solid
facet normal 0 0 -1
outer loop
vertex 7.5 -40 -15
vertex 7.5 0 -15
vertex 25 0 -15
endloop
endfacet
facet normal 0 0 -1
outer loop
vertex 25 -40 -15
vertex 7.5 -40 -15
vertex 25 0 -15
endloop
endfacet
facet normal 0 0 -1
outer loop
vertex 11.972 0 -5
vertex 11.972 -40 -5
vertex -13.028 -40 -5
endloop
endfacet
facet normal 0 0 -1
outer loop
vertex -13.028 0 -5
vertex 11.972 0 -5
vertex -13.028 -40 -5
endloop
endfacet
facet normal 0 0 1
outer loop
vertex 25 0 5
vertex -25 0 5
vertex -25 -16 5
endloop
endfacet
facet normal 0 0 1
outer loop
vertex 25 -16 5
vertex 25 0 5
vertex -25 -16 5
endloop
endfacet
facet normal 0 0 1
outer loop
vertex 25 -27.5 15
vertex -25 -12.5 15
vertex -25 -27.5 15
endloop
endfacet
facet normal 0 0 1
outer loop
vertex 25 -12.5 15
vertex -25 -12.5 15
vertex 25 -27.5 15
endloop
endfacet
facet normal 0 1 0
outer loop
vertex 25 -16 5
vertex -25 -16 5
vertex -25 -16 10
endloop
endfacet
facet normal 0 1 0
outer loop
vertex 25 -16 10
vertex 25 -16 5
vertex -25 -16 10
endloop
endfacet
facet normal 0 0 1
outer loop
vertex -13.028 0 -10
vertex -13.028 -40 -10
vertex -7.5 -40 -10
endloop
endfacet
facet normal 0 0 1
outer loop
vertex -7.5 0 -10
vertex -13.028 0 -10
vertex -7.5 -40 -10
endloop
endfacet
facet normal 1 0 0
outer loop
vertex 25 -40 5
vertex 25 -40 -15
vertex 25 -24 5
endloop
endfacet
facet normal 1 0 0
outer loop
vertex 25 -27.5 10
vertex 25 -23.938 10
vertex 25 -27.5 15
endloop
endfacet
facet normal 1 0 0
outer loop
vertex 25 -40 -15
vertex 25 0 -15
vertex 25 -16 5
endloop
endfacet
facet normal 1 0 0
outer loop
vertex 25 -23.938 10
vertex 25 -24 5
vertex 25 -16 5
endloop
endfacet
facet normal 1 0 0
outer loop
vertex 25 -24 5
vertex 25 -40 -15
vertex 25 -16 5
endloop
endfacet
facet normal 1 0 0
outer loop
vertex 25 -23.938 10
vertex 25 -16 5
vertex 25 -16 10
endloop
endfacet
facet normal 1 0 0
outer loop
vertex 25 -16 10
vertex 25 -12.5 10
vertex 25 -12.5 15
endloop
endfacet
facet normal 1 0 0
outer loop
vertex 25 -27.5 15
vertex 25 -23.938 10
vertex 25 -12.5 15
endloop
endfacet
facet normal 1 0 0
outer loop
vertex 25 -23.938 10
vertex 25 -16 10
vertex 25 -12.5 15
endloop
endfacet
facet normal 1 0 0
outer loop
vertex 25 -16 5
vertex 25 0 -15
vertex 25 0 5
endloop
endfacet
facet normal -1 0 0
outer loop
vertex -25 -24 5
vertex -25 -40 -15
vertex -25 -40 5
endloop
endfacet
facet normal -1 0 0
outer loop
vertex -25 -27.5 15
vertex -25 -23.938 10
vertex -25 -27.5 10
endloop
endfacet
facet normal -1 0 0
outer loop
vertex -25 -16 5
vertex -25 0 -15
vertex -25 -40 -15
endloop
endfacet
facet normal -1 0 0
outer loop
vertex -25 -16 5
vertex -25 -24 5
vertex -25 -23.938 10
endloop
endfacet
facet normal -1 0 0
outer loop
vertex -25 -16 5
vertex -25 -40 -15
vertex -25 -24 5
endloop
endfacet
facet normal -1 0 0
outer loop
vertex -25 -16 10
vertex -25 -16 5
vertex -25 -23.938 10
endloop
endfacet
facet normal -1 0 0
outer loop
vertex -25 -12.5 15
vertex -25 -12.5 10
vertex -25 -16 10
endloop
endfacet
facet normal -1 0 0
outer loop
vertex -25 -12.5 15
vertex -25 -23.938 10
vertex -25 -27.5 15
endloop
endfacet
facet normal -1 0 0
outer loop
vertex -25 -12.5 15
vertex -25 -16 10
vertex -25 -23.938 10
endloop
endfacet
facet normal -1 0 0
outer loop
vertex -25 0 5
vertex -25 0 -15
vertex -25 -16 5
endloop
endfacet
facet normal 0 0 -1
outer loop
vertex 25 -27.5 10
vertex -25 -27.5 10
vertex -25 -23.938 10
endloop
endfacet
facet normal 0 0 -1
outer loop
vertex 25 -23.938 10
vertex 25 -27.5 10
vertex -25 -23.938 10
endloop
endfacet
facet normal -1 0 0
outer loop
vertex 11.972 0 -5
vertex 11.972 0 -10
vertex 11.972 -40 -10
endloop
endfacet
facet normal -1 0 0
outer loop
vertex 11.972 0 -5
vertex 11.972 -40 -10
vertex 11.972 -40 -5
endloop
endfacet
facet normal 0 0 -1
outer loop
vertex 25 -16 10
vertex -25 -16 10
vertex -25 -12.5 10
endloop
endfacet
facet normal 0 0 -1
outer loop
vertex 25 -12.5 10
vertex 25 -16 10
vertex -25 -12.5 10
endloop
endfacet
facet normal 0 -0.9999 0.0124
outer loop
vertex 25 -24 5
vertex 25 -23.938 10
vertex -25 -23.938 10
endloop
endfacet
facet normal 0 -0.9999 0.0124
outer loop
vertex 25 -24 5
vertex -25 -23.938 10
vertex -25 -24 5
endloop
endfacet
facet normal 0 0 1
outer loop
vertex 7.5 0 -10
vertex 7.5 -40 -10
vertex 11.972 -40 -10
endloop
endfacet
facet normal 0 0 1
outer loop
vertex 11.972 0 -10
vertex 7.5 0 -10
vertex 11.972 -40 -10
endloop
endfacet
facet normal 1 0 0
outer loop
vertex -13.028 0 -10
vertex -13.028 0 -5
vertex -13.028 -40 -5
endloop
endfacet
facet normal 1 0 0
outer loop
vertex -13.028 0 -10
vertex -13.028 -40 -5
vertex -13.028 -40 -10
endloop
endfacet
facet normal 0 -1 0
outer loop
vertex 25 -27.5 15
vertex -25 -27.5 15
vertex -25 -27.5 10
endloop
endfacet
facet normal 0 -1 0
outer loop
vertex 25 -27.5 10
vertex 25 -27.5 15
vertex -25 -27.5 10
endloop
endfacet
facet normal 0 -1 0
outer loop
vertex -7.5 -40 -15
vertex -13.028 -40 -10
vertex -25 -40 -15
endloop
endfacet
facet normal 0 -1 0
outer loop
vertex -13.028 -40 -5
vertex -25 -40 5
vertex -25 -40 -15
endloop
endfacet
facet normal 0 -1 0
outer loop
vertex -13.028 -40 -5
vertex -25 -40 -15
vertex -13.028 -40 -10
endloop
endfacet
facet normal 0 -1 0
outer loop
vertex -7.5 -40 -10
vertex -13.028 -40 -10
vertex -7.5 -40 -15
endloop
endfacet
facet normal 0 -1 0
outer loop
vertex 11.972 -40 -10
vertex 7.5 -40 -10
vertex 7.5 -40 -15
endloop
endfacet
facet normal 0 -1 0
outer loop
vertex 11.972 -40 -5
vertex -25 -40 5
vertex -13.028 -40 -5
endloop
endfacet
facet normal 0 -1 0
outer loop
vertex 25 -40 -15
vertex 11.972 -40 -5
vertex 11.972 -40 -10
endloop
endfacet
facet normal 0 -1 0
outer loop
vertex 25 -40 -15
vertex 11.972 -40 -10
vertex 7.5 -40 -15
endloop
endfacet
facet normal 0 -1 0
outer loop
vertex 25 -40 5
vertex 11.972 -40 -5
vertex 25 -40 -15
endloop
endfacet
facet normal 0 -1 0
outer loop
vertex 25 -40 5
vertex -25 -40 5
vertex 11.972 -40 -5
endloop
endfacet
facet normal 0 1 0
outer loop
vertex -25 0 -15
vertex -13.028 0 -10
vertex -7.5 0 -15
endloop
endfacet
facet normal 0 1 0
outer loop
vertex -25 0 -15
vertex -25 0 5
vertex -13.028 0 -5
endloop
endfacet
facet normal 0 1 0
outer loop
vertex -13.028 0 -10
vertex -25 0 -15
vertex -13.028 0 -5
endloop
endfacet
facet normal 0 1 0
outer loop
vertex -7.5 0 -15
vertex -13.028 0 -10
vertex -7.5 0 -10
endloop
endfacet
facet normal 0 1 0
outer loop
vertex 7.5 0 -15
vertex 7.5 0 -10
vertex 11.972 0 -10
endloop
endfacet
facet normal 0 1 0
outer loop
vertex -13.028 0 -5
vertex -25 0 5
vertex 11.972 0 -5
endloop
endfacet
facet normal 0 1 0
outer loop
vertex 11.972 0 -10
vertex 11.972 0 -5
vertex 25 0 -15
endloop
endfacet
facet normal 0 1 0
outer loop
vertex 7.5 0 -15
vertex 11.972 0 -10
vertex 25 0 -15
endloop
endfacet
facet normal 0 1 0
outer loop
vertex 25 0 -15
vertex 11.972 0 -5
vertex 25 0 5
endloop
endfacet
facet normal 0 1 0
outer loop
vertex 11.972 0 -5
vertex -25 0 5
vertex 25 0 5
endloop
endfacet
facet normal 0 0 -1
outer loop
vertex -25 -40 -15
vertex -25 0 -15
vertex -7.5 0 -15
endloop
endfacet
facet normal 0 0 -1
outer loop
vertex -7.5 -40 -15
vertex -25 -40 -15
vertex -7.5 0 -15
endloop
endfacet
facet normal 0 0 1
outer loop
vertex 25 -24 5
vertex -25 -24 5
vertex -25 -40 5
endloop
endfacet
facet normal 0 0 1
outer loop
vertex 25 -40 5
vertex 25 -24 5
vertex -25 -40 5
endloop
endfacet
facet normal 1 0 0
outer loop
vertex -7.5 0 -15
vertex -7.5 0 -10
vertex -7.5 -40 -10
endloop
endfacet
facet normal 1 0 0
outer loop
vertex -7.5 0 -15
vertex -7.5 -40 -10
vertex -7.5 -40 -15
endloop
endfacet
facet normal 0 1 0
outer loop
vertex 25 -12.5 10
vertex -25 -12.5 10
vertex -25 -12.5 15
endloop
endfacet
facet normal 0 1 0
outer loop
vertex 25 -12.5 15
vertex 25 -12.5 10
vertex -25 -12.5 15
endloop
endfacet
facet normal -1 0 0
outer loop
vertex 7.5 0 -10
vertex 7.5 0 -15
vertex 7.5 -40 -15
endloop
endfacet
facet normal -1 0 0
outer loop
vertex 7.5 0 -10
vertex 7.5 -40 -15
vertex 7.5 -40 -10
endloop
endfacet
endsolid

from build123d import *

# Parameters (mm, degrees)
F0_W     = 50
F0_H     = 30
F1_DEPTH = 40
F3_DEPTH = 50.001
F5_DEPTH = 40.001


with BuildPart() as f1:
    # F0 (on Front) → F1 (new body)
    with BuildSketch(Plane.XZ):
        Rectangle(F0_W, F0_H)
    extrude(amount=F1_DEPTH)

    # F2 (on face) → F3 (cut, through all)
    with BuildSketch(Plane(origin=(-25, 0, 0), x_dir=(0, -1, 0), z_dir=(-1, 0, 0))):
        Polygon((16, 5), (16, 10), (12.5, 10), (12.5, 15), (0, 15), (0, 5), align=None)
        Polygon((40, 15), (27.5, 15), (27.5, 10), (23.938067, 10), (24, 5), (40, 5), align=None)
    extrude(amount=-F3_DEPTH, mode=Mode.SUBTRACT)

    # F4 (on face) → F5 (cut, through all)
    with BuildSketch(Plane.XZ.offset(40)):
        Polygon((-7.5, -10), (-7.5, -15), (7.5, -15), (7.5, -10), (11.972041, -10), (11.972041, -5), (-13.027959, -5), (-13.027959, -10), align=None)
    extrude(amount=-F5_DEPTH, mode=Mode.SUBTRACT)


solid = f1.part
